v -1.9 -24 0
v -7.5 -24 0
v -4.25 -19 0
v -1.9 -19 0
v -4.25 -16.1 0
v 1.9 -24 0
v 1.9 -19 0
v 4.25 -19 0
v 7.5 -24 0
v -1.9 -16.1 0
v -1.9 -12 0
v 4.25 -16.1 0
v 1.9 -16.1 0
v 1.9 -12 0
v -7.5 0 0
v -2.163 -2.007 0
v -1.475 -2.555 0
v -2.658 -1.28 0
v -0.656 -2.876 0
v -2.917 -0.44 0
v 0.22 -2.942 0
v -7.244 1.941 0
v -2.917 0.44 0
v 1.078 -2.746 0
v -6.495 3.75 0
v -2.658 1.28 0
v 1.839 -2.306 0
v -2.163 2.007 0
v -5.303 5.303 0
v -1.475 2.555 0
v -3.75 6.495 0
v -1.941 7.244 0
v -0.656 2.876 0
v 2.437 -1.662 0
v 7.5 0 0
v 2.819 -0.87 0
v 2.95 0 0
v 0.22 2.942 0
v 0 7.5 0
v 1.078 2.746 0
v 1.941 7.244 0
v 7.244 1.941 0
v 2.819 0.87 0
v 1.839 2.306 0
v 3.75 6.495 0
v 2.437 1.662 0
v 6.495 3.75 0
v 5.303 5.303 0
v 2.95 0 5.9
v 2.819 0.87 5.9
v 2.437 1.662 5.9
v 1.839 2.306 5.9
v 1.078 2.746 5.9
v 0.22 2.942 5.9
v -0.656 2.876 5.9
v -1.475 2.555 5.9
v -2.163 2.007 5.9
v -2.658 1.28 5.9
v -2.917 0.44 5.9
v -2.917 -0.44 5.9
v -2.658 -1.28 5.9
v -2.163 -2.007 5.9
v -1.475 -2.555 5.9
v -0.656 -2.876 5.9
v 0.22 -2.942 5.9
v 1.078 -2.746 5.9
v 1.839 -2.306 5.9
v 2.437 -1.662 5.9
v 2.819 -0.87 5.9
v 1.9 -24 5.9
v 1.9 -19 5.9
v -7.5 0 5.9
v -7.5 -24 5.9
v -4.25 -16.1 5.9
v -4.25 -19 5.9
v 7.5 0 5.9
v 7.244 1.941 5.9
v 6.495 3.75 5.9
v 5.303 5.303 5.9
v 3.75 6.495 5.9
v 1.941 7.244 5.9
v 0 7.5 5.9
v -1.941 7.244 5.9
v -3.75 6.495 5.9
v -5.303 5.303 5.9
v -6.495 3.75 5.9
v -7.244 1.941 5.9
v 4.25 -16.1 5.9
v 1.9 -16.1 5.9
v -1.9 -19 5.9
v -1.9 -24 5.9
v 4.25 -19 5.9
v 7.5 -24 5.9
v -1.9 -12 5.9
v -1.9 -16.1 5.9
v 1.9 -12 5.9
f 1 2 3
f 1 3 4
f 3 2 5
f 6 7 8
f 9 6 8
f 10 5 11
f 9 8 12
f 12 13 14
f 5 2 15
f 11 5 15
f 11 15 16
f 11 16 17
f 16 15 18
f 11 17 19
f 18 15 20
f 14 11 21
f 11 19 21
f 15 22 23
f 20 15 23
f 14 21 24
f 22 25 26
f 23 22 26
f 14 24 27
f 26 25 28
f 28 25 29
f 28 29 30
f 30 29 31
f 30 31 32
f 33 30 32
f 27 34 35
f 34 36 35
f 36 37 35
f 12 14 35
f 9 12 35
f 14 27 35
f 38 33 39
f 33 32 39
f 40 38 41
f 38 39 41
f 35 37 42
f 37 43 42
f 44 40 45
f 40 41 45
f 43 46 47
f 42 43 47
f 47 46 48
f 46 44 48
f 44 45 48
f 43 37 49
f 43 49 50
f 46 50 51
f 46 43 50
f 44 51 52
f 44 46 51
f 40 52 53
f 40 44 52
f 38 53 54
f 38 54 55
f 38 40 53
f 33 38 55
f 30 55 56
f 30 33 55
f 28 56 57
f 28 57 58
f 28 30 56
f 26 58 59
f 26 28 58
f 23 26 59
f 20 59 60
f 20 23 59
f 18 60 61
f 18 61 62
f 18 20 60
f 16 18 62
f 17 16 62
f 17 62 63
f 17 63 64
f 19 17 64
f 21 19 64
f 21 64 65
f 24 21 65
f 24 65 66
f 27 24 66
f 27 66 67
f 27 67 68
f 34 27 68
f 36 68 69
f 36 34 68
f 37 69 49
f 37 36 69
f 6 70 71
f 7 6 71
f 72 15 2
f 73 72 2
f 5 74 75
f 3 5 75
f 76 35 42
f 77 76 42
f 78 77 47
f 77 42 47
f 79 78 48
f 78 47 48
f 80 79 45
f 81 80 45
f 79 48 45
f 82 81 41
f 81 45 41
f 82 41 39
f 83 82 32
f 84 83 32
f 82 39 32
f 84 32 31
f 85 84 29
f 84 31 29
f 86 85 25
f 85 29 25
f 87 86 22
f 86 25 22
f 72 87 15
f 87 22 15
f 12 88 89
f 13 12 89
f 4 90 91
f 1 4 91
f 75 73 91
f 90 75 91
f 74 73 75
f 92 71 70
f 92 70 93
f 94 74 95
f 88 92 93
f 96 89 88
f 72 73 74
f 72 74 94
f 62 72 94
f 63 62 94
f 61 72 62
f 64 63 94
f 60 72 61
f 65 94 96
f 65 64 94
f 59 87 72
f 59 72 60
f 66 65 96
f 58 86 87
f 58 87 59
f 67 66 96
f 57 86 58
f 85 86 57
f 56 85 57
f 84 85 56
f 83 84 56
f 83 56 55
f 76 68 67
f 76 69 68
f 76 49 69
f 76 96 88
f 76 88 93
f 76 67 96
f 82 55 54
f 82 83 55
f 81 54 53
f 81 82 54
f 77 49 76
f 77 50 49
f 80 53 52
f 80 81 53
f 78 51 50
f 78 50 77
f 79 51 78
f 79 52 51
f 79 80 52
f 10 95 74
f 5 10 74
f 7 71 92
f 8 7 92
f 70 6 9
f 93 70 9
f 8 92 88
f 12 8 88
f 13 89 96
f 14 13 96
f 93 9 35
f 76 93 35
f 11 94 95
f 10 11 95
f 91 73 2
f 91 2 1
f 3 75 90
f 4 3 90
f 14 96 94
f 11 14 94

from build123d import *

# Parameters (mm, degrees)
SKETCH1_R           = 2.95
BOSS_EXTRUDE1_DEPTH = 5.9
CUT_EXTRUDE2_DEPTH  = 26.827504719


with BuildPart() as part:
    # Sketch1 → Boss-Extrude1 (new body)
    with BuildSketch(Plane.XY):
        with BuildLine():
            Line((-7.5, 0), (-7.5, -24))
            Line((-7.5, -24), (7.5, -24))
            Line((7.5, -24), (7.5, 0))
            ThreePointArc((7.5, 0), (0, 7.5), (-7.5, 0))
        make_face()
        Circle(SKETCH1_R, mode=Mode.SUBTRACT)
    extrude(amount=BOSS_EXTRUDE1_DEPTH)

    # Sketch3 → Cut-Extrude2 (cut, through all)
    with BuildSketch(Plane.XY.offset(5.9)):
        Polygon((-1.9, -24), (1.9, -24), (1.9, -19), (4.25, -19), (4.25, -16.1), (1.9, -16.1), (1.9, -12), (-1.9, -12), (-1.9, -16.1), (-4.25, -16.1), (-4.25, -19), (-1.9, -19), align=None)
    extrude(amount=-CUT_EXTRUDE2_DEPTH, mode=Mode.SUBTRACT)


solid = part.part
